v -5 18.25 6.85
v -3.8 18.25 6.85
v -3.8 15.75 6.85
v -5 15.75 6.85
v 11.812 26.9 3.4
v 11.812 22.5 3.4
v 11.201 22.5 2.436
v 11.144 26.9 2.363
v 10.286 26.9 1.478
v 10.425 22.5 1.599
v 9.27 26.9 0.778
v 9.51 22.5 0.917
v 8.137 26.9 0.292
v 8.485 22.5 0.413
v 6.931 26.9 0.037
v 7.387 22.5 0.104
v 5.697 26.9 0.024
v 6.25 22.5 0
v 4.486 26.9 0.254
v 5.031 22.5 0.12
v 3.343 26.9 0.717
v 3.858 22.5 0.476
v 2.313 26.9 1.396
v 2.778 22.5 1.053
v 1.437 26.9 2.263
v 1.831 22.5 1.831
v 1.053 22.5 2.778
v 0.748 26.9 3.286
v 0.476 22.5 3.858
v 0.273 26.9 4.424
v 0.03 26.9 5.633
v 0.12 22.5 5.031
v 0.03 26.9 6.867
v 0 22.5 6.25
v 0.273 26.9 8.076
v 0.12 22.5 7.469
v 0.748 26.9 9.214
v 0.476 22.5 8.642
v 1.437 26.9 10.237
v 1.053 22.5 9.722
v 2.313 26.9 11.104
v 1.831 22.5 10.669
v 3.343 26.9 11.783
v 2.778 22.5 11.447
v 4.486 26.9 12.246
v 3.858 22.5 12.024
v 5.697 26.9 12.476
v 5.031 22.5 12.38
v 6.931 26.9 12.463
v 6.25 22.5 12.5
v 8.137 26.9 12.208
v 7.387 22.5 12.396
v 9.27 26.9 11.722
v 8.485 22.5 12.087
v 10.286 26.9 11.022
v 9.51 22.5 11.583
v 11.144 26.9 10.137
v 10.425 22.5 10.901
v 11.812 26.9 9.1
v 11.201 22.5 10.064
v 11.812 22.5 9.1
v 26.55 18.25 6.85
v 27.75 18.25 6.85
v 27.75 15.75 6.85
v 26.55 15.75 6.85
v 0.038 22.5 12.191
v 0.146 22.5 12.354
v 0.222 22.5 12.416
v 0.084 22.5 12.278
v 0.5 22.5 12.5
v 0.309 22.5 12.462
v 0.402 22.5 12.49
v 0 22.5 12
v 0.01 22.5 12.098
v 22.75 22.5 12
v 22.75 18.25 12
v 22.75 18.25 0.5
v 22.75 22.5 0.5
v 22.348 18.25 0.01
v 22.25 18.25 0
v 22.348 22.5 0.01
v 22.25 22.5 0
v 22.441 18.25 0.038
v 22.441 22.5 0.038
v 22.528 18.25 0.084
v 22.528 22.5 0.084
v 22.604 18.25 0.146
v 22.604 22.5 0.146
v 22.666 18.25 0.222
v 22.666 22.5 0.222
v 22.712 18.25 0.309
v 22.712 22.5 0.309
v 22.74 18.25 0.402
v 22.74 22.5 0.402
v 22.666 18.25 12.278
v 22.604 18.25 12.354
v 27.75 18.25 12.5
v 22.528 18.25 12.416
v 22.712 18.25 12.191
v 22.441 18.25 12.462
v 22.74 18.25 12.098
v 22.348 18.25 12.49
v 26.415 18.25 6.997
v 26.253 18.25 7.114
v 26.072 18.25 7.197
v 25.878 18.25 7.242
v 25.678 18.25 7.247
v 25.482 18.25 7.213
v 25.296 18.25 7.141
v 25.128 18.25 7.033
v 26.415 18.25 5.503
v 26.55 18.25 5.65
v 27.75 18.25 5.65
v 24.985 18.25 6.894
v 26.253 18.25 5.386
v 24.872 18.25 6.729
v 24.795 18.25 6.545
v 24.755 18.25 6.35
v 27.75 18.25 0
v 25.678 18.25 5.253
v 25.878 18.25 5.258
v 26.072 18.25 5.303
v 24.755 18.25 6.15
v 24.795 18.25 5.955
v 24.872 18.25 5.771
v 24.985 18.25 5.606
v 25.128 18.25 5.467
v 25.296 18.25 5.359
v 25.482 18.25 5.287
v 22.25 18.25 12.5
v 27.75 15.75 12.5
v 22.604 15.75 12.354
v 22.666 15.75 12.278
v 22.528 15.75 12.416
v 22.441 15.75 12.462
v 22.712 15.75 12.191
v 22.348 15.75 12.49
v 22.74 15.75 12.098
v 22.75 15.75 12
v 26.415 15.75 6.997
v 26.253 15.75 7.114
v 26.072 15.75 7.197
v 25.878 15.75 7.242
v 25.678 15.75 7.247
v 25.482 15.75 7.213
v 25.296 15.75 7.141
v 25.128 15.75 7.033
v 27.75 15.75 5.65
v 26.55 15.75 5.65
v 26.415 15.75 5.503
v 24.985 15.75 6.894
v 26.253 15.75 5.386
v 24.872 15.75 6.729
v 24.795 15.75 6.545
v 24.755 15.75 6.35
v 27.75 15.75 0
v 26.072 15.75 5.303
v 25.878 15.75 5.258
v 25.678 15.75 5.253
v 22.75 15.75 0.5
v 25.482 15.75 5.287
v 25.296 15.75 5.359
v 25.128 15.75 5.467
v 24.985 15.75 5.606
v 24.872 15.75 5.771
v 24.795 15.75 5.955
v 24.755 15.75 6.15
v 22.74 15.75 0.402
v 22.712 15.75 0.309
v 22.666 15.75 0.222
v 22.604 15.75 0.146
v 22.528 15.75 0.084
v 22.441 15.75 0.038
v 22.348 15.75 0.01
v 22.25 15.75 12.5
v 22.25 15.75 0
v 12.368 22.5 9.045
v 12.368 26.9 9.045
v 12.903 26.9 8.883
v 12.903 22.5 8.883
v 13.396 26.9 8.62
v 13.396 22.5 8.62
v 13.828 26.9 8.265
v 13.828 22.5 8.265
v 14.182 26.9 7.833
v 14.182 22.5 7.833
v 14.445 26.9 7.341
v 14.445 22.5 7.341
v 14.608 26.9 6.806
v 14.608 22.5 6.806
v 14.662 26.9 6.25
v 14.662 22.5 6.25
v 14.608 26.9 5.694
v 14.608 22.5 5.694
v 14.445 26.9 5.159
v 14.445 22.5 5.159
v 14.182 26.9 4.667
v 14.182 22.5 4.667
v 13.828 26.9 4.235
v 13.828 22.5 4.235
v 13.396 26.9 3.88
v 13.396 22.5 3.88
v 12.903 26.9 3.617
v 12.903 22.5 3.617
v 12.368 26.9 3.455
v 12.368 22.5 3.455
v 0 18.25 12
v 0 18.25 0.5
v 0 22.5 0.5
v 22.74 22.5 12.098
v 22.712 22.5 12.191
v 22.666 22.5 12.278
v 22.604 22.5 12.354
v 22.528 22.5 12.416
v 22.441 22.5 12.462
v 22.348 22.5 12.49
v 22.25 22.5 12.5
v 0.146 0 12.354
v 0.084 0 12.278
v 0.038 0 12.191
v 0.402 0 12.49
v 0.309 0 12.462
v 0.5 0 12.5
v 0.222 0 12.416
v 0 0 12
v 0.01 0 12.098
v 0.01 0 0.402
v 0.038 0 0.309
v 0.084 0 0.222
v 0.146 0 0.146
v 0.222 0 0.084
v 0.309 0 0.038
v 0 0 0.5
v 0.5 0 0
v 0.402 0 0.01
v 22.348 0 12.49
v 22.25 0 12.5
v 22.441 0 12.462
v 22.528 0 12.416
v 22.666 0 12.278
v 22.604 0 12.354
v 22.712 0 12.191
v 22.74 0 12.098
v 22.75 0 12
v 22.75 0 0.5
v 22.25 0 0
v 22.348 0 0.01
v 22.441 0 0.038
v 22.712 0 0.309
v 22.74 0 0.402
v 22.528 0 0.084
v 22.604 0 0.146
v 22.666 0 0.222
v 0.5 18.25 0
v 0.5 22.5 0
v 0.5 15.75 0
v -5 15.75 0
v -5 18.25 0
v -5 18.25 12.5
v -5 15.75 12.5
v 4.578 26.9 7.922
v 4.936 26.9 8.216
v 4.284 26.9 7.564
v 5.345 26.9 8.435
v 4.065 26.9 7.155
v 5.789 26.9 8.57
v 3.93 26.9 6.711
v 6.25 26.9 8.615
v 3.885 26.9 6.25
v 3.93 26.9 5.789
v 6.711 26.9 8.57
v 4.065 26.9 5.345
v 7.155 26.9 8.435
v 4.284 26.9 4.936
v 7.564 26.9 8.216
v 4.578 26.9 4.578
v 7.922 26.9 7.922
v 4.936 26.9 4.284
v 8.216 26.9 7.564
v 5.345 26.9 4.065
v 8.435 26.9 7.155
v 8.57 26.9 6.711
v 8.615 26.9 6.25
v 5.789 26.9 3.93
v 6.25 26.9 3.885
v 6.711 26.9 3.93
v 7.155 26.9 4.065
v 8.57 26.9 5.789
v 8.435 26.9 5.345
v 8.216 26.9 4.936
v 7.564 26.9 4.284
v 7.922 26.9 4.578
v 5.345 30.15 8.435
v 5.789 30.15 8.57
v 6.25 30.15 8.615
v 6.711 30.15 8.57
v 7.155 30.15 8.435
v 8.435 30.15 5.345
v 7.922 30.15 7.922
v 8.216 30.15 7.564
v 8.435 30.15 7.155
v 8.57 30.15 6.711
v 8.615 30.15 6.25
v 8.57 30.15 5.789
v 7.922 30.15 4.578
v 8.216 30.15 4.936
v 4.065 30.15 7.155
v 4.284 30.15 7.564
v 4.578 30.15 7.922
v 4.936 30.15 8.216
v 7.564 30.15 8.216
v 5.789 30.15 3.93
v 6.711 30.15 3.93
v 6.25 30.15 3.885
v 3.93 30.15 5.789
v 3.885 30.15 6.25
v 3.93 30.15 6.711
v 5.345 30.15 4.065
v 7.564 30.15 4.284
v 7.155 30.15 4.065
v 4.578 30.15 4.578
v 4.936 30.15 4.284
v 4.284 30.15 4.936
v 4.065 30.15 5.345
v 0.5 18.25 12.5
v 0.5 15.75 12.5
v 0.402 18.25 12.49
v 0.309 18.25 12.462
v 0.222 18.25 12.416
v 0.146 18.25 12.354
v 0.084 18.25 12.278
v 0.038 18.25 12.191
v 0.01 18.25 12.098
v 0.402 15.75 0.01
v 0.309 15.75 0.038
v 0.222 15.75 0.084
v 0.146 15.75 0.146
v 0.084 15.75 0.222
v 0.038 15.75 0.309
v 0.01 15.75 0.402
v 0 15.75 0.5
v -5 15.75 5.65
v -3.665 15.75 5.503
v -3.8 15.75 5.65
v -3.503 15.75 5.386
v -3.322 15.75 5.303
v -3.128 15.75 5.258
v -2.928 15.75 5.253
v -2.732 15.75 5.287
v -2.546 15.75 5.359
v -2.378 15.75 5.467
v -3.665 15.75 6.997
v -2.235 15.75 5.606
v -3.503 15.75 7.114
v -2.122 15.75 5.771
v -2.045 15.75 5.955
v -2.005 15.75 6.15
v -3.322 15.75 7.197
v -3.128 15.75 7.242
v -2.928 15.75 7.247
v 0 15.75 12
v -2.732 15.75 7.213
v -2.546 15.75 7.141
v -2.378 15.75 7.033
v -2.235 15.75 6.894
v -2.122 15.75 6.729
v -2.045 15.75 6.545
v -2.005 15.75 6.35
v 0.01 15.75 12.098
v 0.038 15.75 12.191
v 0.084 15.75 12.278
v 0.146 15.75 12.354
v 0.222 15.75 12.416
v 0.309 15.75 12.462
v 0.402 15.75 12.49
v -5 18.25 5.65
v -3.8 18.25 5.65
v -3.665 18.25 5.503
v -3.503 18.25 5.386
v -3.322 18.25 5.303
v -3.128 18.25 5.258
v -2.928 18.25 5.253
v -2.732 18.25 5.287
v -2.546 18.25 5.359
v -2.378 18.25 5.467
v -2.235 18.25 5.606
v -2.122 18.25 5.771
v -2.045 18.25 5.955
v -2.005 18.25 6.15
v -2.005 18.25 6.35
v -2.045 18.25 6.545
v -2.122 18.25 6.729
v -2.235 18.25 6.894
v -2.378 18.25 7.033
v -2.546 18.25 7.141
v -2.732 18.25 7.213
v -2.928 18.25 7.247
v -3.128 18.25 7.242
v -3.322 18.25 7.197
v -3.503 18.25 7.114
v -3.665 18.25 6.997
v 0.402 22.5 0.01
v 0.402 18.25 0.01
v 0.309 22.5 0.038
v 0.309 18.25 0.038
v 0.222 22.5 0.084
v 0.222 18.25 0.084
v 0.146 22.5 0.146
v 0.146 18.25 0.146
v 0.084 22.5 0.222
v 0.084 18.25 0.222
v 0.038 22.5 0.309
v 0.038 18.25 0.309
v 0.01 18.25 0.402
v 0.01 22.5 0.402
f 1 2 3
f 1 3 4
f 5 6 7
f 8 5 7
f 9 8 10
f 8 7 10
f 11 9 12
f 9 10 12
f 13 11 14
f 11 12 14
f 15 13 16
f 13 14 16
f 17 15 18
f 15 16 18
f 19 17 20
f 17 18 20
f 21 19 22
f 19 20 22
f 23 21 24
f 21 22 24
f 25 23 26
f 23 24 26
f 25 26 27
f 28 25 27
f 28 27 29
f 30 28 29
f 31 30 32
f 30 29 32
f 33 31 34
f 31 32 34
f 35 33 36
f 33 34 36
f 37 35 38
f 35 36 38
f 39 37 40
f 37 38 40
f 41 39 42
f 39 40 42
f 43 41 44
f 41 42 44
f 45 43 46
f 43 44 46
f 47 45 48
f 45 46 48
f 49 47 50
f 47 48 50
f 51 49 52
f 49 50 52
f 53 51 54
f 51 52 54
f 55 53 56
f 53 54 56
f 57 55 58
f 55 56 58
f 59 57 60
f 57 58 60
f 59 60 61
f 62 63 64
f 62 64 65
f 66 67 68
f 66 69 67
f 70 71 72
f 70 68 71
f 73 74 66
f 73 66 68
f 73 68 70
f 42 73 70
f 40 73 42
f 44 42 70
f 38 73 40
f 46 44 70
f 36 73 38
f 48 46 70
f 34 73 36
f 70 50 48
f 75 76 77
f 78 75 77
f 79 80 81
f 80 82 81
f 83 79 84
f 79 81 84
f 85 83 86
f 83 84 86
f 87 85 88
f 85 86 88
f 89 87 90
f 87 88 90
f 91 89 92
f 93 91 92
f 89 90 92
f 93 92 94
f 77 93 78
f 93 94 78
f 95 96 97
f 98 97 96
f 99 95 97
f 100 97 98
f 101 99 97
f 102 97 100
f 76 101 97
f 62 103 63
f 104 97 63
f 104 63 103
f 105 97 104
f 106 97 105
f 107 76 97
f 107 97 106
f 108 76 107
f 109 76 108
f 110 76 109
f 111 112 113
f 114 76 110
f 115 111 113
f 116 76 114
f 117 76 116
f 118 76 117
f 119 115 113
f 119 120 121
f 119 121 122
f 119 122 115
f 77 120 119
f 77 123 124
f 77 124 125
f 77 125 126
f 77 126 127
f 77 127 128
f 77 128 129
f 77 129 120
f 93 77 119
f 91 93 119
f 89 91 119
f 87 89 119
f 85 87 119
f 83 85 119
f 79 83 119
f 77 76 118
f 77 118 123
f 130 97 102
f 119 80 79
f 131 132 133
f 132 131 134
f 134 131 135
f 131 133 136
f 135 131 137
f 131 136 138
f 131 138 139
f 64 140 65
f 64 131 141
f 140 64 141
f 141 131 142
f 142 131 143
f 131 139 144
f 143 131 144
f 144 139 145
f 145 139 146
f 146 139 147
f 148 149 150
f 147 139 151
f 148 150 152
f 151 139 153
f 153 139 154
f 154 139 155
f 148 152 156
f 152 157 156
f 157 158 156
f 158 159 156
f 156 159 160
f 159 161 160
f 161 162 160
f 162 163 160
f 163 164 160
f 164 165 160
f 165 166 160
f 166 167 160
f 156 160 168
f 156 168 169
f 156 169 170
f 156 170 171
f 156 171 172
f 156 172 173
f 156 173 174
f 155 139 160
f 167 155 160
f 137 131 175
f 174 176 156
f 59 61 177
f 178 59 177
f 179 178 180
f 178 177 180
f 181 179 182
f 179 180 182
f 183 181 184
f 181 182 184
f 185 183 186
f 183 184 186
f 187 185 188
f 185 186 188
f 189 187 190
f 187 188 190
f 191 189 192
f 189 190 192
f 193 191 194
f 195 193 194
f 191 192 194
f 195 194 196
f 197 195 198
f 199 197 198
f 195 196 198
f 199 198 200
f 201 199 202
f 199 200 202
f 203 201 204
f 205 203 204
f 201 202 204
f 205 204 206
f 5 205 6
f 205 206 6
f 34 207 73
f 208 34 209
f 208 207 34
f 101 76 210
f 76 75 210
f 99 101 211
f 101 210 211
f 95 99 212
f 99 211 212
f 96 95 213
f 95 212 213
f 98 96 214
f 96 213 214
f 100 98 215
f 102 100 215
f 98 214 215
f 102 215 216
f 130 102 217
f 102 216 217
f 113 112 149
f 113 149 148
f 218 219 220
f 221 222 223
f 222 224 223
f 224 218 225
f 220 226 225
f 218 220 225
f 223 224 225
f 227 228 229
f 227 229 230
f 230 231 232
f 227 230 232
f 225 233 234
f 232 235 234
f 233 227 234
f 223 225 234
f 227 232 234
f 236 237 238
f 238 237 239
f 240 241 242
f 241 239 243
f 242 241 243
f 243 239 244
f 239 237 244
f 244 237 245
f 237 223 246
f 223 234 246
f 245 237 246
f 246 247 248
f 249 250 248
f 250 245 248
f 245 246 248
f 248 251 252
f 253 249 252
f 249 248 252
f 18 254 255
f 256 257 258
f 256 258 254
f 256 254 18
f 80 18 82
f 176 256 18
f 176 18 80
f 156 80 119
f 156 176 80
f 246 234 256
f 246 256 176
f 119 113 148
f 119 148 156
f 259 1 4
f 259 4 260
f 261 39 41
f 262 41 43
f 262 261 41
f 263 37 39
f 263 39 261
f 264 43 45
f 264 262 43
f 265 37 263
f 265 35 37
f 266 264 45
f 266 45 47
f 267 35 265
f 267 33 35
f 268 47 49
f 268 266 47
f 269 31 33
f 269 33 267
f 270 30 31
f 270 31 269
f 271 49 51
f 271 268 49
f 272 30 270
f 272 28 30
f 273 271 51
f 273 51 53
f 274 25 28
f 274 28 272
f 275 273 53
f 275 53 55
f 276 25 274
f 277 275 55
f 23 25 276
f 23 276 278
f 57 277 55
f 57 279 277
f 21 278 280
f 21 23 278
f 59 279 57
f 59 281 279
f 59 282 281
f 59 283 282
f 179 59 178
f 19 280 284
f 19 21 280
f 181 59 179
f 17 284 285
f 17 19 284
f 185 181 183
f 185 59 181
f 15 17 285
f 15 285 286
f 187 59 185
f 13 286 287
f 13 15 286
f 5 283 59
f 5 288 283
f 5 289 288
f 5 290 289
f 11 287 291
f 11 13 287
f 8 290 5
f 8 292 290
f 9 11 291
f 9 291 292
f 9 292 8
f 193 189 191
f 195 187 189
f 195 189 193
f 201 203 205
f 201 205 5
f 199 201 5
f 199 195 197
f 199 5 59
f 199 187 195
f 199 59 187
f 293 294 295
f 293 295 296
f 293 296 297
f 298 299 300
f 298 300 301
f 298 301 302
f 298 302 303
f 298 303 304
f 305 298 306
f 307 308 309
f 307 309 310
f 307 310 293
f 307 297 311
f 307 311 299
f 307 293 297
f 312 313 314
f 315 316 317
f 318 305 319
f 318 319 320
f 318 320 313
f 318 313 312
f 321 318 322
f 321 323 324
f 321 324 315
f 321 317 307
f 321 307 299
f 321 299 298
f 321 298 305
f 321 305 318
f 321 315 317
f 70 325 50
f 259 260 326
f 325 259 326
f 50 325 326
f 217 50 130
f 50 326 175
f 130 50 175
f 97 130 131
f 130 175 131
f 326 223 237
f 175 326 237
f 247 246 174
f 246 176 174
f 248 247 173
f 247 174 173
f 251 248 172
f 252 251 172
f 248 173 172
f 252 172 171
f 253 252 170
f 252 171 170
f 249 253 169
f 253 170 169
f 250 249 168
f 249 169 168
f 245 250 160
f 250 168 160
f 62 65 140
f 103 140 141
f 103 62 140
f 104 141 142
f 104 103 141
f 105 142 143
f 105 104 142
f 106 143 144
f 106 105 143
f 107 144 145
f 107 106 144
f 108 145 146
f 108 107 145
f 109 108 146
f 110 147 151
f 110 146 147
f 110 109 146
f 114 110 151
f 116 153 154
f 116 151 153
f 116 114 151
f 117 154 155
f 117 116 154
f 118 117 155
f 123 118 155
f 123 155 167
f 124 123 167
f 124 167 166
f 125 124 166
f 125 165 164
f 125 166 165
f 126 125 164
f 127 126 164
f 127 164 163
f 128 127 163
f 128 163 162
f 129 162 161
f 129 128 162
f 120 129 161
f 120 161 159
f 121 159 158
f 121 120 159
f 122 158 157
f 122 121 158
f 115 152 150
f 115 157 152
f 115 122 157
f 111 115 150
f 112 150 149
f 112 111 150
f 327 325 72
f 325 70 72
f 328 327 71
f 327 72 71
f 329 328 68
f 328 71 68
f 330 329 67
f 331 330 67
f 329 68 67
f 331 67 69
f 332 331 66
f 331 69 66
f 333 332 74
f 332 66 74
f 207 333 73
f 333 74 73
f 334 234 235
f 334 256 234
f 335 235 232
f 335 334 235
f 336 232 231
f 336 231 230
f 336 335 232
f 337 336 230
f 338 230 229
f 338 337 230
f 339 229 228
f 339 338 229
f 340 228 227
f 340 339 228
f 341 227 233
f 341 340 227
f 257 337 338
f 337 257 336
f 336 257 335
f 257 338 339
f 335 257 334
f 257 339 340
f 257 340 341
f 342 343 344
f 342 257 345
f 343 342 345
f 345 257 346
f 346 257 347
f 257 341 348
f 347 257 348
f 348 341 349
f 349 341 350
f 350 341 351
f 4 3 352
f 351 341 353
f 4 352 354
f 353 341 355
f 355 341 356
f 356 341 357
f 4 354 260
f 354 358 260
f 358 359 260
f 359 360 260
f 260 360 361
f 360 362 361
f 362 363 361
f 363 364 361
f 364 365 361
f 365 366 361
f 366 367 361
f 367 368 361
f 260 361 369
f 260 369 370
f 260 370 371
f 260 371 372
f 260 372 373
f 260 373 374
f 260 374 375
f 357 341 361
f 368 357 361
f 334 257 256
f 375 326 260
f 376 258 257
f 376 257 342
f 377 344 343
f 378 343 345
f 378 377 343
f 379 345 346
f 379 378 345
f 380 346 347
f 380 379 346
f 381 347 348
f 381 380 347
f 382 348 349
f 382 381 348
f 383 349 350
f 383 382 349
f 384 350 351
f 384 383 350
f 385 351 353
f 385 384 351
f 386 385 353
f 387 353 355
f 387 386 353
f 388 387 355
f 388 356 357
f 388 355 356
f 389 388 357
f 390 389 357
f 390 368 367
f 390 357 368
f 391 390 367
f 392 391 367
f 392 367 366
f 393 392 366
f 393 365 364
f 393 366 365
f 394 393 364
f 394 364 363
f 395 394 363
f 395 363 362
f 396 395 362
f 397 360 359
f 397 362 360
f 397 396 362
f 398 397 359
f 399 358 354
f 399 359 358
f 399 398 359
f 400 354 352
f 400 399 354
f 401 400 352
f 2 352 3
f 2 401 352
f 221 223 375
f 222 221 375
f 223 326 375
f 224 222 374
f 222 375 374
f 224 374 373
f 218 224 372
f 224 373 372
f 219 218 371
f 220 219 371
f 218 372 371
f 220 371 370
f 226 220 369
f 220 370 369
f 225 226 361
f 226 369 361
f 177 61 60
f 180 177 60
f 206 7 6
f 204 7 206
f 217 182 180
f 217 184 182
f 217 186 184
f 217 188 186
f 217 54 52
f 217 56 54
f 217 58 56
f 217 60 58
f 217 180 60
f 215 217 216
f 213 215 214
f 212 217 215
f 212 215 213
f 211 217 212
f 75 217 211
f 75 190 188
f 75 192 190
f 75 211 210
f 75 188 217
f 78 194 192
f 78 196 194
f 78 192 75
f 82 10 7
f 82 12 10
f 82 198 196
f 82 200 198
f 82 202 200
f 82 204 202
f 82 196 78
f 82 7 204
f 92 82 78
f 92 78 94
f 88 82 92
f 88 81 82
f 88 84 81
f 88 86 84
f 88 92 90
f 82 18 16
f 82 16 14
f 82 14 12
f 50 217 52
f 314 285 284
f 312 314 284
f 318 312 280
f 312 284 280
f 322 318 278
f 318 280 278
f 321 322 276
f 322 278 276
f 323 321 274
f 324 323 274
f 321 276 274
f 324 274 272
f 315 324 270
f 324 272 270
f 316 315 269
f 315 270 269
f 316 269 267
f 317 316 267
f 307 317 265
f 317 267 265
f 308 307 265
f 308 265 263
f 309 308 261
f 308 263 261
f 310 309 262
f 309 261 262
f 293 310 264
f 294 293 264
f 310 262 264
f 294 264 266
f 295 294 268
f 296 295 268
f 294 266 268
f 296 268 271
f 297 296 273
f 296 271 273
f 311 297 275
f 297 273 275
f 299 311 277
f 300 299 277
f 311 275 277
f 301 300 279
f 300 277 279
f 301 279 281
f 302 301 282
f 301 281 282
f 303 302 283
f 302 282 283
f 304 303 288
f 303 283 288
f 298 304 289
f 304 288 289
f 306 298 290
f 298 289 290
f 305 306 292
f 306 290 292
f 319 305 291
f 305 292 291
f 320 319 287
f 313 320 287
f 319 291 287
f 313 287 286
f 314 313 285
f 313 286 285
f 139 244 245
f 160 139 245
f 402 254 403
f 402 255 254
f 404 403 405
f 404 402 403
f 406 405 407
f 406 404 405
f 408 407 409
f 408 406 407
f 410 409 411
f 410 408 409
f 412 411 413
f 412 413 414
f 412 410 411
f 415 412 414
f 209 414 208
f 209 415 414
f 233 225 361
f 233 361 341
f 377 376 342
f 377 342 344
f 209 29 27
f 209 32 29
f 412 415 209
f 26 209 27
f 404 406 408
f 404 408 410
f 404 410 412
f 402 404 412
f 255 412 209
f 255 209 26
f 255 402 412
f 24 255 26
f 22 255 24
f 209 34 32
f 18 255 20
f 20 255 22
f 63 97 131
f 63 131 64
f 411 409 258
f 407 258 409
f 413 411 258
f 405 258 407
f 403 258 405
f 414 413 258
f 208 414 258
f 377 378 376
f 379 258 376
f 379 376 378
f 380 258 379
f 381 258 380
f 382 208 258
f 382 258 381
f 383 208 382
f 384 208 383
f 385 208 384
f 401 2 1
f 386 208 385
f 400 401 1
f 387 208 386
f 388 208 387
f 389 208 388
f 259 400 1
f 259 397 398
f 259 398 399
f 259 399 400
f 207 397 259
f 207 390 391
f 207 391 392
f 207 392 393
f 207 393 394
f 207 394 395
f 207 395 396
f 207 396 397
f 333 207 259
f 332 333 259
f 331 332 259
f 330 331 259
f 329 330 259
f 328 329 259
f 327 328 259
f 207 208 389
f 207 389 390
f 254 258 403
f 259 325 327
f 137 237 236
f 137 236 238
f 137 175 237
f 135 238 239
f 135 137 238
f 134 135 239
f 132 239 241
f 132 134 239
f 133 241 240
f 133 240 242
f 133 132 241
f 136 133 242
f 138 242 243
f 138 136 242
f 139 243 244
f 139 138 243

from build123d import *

# Parameters (mm, degrees)
SKETCH1_W           = 22.75
SKETCH1_H           = 12.5
BOSS_EXTRUDE1_DEPTH = 22.5
BOSS_EXTRUDE2_DEPTH = 4.4
SKETCH3_R           = 2.365
BOSS_EXTRUDE3_DEPTH = 3.25
SKETCH4_W           = 12.5
SKETCH4_H           = 2.5
BOSS_EXTRUDE4_DEPTH = 5
SKETCH5_W           = 12.5
SKETCH5_H           = 2.5
BOSS_EXTRUDE5_DEPTH = 5
CUT_EXTRUDE1_DEPTH  = 36.487673916
FILLET1_R           = 0.5


with BuildPart() as part:
    # Sketch1 → Boss-Extrude1 (new body)
    with BuildSketch(Plane(origin=(0, 0, 0), x_dir=(1, 0, 0), z_dir=(0, 1, 0))):
        with Locations((11.375, -6.25)):
            Rectangle(SKETCH1_W, SKETCH1_H)
    extrude(amount=BOSS_EXTRUDE1_DEPTH)

    # Sketch2 → Boss-Extrude2 (add)
    with BuildSketch(Plane(origin=(0, 22.5, 0), x_dir=(1, 0, 0), z_dir=(0, 1, 0))):
        with BuildLine():
            ThreePointArc((11.812373594, -3.4), (0, -6.25), (11.812373594, -9.1))
            ThreePointArc((11.812373594, -9.1), (14.662373594, -6.25), (11.812373594, -3.4))
        make_face()
    extrude(amount=BOSS_EXTRUDE2_DEPTH)

    # Sketch3 → Boss-Extrude3 (add)
    with BuildSketch(Plane(origin=(0, 26.9, 0), x_dir=(1, 0, 0), z_dir=(0, 1, 0))):
        with Locations(Location((6.25, -6.25, 0), (0, 0, 90))):
            Circle(SKETCH3_R)
    extrude(amount=BOSS_EXTRUDE3_DEPTH)

    # Sketch4 → Boss-Extrude4 (add)
    with BuildSketch(Plane(origin=(22.75, 0, 0), x_dir=(0, 0, -1), z_dir=(1, 0, 0))):
        with Locations((-6.25, 17)):
            Rectangle(SKETCH4_W, SKETCH4_H)
    extrude(amount=BOSS_EXTRUDE4_DEPTH)

    # Sketch5 → Boss-Extrude5 (add)
    with BuildSketch(Plane.ZY):
        with Locations((6.25, 17)):
            Rectangle(SKETCH5_W, SKETCH5_H)
    extrude(amount=BOSS_EXTRUDE5_DEPTH)

    # Sketch6 → Cut-Extrude1 (cut, through all)
    with BuildSketch(Plane(origin=(0, 18.25, 0), x_dir=(1, 0, 0), z_dir=(0, 1, 0))):
        with BuildLine():
            Line((27.75, -5.65), (27.75, -6.85))
            Line((27.75, -6.85), (26.55, -6.85))
            ThreePointArc((26.55, -6.85), (24.75, -6.25), (26.55, -5.65))
            Line((26.55, -5.65), (27.75, -5.65))
        make_face()
        with BuildLine():
            Line((-5, -6.85), (-5, -5.65))
            Line((-5, -5.65), (-3.8, -5.65))
            ThreePointArc((-3.8, -5.65), (-2, -6.25), (-3.8, -6.85))
            Line((-3.8, -6.85), (-5, -6.85))
        make_face()
    extrude(amount=-CUT_EXTRUDE1_DEPTH, mode=Mode.SUBTRACT)

    # Fillet1
    fillet1_edges = [part.edges().sort_by_distance(p)[0] for p in [
        (22.75, 7.875, 0),
        (22.75, 7.875, 12.5),
        (0, 7.875, 0),
        (0, 7.875, 12.5),
        (0, 20.375, 0),
        (22.75, 20.375, 0),
        (22.75, 20.375, 12.5),
        (0, 20.375, 12.5),
    ]]
    fillet(fillet1_edges, radius=FILLET1_R)


solid = part.part
